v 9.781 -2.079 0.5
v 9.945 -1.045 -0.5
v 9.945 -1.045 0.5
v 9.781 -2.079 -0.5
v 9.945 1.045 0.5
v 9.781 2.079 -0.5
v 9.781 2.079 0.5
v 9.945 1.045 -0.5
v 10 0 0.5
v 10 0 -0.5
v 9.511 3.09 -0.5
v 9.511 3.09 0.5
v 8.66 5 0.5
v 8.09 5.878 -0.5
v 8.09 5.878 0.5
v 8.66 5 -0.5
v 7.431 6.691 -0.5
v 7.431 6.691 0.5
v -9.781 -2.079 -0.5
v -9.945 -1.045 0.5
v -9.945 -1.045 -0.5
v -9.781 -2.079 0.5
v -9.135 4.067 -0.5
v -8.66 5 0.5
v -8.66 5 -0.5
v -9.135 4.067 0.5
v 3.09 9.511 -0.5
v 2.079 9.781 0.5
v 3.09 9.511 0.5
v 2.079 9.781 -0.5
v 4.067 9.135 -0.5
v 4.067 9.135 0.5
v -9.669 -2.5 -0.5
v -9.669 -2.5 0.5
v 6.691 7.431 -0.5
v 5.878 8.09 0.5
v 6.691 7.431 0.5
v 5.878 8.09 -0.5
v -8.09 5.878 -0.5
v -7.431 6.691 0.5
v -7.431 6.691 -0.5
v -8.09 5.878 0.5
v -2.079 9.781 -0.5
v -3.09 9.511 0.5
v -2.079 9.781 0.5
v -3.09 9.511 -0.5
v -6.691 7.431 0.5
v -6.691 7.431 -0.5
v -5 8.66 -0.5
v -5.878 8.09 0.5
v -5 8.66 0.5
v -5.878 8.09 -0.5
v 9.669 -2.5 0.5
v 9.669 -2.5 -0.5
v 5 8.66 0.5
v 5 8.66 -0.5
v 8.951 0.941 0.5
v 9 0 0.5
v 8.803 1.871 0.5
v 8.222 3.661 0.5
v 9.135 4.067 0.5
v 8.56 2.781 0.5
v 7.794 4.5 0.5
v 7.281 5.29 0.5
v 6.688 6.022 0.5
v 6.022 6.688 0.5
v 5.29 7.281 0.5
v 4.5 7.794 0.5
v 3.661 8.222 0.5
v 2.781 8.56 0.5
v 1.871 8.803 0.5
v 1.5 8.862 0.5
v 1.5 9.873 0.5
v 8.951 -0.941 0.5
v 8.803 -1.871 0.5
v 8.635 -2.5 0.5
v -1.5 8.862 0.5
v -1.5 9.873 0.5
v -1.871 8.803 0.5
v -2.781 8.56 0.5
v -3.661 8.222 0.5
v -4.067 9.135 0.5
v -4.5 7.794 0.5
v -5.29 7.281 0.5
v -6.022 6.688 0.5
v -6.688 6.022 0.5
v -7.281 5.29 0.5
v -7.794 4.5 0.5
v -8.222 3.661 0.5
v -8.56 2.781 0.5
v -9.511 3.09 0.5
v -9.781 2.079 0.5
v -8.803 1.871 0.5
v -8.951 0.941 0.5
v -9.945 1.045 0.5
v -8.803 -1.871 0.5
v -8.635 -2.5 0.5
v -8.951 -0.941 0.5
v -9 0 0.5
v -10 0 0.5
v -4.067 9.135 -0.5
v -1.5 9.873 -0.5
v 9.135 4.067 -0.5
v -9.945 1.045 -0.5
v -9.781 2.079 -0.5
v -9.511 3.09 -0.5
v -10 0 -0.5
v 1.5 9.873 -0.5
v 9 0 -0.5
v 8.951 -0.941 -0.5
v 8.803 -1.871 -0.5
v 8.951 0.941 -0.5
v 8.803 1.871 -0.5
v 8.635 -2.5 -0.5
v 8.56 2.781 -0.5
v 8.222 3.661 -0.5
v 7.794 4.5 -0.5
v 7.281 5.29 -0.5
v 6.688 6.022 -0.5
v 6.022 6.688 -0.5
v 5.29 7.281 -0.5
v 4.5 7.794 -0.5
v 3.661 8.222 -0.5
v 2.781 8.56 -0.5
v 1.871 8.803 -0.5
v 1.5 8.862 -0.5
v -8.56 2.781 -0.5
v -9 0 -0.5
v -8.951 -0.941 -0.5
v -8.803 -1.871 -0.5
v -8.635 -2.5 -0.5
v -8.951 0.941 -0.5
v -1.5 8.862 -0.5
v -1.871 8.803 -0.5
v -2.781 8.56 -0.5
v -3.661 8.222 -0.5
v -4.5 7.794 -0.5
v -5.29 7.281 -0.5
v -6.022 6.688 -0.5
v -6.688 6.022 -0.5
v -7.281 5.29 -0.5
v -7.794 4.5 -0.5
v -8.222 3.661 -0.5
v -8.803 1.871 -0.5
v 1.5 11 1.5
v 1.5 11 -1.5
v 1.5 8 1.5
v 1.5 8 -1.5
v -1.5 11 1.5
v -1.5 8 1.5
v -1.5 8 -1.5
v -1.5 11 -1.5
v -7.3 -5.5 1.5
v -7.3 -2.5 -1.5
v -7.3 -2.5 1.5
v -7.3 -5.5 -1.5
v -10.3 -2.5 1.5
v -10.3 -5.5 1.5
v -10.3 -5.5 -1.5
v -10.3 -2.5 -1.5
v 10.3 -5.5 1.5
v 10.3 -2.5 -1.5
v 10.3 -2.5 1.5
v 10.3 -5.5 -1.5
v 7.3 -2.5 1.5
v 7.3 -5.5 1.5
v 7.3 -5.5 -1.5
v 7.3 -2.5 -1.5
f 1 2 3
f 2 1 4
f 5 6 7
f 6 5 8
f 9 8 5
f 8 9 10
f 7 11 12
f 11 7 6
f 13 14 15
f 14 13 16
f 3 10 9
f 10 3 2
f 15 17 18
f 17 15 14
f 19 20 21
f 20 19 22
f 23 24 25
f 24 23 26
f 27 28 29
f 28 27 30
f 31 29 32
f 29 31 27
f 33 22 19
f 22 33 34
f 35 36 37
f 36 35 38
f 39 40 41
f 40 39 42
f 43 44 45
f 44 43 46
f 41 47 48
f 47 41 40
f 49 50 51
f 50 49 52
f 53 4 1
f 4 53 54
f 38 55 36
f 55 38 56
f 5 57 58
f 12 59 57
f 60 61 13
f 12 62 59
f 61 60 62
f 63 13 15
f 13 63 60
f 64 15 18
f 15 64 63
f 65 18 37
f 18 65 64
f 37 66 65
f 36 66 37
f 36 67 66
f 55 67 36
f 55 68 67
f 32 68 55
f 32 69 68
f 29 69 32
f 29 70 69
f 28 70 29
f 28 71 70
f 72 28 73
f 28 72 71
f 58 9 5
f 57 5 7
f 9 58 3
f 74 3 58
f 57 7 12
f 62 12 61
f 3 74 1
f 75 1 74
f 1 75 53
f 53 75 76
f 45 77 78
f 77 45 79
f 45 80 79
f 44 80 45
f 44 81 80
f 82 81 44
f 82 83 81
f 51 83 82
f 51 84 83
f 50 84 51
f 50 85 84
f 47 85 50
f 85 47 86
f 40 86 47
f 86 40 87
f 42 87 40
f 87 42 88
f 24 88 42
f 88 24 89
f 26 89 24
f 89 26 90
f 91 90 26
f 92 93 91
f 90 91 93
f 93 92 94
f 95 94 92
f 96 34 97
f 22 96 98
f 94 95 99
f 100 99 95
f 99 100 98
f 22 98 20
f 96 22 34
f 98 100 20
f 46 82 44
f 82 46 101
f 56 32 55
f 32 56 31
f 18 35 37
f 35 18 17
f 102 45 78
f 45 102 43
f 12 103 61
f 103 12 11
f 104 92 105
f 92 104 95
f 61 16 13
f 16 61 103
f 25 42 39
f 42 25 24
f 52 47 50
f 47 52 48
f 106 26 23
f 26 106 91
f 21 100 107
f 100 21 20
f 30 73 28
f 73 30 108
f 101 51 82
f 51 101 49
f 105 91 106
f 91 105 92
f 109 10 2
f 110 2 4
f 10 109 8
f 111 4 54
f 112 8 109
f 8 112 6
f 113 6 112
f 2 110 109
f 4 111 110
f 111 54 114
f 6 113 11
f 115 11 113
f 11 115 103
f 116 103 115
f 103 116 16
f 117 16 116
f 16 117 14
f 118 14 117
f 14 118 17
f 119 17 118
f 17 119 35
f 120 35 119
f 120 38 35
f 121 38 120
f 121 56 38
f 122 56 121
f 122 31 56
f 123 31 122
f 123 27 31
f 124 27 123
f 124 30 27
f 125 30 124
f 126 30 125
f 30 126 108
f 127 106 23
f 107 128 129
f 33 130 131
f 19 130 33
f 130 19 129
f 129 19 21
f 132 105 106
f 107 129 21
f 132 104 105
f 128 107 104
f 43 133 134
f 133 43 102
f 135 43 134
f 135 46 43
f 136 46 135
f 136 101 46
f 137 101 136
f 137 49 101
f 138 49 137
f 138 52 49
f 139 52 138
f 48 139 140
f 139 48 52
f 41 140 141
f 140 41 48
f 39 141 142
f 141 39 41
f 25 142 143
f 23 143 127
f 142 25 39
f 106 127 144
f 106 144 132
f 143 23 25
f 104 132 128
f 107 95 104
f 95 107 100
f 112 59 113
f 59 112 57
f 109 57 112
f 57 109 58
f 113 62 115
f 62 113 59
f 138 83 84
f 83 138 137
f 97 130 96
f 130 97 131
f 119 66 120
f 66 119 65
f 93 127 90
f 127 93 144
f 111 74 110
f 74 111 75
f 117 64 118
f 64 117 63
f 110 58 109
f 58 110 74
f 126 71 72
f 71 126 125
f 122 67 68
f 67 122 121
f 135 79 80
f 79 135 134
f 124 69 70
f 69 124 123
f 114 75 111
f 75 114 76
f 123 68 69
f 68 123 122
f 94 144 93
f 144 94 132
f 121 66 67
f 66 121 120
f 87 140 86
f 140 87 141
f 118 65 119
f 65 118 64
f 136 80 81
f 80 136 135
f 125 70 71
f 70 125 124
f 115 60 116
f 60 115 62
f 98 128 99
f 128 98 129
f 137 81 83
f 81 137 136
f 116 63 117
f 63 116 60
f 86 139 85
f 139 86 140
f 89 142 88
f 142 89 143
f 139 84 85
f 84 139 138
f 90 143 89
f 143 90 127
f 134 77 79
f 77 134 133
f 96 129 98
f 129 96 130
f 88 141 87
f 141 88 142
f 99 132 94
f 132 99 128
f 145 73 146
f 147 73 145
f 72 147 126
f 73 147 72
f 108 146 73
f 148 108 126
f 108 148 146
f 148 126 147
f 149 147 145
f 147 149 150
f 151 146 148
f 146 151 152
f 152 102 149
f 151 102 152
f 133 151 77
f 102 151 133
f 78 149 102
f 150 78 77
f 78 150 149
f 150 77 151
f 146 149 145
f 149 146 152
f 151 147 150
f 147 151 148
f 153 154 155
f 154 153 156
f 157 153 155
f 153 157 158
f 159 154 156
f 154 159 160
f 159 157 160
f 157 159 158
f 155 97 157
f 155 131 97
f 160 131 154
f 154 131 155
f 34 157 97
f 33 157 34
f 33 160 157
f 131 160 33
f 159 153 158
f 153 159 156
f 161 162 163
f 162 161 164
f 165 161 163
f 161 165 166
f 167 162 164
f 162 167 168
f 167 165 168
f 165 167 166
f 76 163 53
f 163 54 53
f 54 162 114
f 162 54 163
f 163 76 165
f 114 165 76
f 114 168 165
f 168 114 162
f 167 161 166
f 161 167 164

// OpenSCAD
module RadialLayoutIcon() {
  kR = 10;
  module Cube_() { cube([3, 3, 3], center = true); }

  difference() {
    cylinder(r = kR,     h = 1, center = true);
    cylinder(r = kR - 1, h = 2, center = true);
    translate([0, -.75 * kR, 0]) cube([2 * kR, .5 * kR, 4], center = true);
  }

  translate([0, kR - .5, 0])          Cube_();
  translate([-.88 * kR, -.4 * kR, 0]) Cube_();
  translate([ .88 * kR, -.4 * kR, 0]) Cube_();
}

RadialLayoutIcon($fn = 60);
